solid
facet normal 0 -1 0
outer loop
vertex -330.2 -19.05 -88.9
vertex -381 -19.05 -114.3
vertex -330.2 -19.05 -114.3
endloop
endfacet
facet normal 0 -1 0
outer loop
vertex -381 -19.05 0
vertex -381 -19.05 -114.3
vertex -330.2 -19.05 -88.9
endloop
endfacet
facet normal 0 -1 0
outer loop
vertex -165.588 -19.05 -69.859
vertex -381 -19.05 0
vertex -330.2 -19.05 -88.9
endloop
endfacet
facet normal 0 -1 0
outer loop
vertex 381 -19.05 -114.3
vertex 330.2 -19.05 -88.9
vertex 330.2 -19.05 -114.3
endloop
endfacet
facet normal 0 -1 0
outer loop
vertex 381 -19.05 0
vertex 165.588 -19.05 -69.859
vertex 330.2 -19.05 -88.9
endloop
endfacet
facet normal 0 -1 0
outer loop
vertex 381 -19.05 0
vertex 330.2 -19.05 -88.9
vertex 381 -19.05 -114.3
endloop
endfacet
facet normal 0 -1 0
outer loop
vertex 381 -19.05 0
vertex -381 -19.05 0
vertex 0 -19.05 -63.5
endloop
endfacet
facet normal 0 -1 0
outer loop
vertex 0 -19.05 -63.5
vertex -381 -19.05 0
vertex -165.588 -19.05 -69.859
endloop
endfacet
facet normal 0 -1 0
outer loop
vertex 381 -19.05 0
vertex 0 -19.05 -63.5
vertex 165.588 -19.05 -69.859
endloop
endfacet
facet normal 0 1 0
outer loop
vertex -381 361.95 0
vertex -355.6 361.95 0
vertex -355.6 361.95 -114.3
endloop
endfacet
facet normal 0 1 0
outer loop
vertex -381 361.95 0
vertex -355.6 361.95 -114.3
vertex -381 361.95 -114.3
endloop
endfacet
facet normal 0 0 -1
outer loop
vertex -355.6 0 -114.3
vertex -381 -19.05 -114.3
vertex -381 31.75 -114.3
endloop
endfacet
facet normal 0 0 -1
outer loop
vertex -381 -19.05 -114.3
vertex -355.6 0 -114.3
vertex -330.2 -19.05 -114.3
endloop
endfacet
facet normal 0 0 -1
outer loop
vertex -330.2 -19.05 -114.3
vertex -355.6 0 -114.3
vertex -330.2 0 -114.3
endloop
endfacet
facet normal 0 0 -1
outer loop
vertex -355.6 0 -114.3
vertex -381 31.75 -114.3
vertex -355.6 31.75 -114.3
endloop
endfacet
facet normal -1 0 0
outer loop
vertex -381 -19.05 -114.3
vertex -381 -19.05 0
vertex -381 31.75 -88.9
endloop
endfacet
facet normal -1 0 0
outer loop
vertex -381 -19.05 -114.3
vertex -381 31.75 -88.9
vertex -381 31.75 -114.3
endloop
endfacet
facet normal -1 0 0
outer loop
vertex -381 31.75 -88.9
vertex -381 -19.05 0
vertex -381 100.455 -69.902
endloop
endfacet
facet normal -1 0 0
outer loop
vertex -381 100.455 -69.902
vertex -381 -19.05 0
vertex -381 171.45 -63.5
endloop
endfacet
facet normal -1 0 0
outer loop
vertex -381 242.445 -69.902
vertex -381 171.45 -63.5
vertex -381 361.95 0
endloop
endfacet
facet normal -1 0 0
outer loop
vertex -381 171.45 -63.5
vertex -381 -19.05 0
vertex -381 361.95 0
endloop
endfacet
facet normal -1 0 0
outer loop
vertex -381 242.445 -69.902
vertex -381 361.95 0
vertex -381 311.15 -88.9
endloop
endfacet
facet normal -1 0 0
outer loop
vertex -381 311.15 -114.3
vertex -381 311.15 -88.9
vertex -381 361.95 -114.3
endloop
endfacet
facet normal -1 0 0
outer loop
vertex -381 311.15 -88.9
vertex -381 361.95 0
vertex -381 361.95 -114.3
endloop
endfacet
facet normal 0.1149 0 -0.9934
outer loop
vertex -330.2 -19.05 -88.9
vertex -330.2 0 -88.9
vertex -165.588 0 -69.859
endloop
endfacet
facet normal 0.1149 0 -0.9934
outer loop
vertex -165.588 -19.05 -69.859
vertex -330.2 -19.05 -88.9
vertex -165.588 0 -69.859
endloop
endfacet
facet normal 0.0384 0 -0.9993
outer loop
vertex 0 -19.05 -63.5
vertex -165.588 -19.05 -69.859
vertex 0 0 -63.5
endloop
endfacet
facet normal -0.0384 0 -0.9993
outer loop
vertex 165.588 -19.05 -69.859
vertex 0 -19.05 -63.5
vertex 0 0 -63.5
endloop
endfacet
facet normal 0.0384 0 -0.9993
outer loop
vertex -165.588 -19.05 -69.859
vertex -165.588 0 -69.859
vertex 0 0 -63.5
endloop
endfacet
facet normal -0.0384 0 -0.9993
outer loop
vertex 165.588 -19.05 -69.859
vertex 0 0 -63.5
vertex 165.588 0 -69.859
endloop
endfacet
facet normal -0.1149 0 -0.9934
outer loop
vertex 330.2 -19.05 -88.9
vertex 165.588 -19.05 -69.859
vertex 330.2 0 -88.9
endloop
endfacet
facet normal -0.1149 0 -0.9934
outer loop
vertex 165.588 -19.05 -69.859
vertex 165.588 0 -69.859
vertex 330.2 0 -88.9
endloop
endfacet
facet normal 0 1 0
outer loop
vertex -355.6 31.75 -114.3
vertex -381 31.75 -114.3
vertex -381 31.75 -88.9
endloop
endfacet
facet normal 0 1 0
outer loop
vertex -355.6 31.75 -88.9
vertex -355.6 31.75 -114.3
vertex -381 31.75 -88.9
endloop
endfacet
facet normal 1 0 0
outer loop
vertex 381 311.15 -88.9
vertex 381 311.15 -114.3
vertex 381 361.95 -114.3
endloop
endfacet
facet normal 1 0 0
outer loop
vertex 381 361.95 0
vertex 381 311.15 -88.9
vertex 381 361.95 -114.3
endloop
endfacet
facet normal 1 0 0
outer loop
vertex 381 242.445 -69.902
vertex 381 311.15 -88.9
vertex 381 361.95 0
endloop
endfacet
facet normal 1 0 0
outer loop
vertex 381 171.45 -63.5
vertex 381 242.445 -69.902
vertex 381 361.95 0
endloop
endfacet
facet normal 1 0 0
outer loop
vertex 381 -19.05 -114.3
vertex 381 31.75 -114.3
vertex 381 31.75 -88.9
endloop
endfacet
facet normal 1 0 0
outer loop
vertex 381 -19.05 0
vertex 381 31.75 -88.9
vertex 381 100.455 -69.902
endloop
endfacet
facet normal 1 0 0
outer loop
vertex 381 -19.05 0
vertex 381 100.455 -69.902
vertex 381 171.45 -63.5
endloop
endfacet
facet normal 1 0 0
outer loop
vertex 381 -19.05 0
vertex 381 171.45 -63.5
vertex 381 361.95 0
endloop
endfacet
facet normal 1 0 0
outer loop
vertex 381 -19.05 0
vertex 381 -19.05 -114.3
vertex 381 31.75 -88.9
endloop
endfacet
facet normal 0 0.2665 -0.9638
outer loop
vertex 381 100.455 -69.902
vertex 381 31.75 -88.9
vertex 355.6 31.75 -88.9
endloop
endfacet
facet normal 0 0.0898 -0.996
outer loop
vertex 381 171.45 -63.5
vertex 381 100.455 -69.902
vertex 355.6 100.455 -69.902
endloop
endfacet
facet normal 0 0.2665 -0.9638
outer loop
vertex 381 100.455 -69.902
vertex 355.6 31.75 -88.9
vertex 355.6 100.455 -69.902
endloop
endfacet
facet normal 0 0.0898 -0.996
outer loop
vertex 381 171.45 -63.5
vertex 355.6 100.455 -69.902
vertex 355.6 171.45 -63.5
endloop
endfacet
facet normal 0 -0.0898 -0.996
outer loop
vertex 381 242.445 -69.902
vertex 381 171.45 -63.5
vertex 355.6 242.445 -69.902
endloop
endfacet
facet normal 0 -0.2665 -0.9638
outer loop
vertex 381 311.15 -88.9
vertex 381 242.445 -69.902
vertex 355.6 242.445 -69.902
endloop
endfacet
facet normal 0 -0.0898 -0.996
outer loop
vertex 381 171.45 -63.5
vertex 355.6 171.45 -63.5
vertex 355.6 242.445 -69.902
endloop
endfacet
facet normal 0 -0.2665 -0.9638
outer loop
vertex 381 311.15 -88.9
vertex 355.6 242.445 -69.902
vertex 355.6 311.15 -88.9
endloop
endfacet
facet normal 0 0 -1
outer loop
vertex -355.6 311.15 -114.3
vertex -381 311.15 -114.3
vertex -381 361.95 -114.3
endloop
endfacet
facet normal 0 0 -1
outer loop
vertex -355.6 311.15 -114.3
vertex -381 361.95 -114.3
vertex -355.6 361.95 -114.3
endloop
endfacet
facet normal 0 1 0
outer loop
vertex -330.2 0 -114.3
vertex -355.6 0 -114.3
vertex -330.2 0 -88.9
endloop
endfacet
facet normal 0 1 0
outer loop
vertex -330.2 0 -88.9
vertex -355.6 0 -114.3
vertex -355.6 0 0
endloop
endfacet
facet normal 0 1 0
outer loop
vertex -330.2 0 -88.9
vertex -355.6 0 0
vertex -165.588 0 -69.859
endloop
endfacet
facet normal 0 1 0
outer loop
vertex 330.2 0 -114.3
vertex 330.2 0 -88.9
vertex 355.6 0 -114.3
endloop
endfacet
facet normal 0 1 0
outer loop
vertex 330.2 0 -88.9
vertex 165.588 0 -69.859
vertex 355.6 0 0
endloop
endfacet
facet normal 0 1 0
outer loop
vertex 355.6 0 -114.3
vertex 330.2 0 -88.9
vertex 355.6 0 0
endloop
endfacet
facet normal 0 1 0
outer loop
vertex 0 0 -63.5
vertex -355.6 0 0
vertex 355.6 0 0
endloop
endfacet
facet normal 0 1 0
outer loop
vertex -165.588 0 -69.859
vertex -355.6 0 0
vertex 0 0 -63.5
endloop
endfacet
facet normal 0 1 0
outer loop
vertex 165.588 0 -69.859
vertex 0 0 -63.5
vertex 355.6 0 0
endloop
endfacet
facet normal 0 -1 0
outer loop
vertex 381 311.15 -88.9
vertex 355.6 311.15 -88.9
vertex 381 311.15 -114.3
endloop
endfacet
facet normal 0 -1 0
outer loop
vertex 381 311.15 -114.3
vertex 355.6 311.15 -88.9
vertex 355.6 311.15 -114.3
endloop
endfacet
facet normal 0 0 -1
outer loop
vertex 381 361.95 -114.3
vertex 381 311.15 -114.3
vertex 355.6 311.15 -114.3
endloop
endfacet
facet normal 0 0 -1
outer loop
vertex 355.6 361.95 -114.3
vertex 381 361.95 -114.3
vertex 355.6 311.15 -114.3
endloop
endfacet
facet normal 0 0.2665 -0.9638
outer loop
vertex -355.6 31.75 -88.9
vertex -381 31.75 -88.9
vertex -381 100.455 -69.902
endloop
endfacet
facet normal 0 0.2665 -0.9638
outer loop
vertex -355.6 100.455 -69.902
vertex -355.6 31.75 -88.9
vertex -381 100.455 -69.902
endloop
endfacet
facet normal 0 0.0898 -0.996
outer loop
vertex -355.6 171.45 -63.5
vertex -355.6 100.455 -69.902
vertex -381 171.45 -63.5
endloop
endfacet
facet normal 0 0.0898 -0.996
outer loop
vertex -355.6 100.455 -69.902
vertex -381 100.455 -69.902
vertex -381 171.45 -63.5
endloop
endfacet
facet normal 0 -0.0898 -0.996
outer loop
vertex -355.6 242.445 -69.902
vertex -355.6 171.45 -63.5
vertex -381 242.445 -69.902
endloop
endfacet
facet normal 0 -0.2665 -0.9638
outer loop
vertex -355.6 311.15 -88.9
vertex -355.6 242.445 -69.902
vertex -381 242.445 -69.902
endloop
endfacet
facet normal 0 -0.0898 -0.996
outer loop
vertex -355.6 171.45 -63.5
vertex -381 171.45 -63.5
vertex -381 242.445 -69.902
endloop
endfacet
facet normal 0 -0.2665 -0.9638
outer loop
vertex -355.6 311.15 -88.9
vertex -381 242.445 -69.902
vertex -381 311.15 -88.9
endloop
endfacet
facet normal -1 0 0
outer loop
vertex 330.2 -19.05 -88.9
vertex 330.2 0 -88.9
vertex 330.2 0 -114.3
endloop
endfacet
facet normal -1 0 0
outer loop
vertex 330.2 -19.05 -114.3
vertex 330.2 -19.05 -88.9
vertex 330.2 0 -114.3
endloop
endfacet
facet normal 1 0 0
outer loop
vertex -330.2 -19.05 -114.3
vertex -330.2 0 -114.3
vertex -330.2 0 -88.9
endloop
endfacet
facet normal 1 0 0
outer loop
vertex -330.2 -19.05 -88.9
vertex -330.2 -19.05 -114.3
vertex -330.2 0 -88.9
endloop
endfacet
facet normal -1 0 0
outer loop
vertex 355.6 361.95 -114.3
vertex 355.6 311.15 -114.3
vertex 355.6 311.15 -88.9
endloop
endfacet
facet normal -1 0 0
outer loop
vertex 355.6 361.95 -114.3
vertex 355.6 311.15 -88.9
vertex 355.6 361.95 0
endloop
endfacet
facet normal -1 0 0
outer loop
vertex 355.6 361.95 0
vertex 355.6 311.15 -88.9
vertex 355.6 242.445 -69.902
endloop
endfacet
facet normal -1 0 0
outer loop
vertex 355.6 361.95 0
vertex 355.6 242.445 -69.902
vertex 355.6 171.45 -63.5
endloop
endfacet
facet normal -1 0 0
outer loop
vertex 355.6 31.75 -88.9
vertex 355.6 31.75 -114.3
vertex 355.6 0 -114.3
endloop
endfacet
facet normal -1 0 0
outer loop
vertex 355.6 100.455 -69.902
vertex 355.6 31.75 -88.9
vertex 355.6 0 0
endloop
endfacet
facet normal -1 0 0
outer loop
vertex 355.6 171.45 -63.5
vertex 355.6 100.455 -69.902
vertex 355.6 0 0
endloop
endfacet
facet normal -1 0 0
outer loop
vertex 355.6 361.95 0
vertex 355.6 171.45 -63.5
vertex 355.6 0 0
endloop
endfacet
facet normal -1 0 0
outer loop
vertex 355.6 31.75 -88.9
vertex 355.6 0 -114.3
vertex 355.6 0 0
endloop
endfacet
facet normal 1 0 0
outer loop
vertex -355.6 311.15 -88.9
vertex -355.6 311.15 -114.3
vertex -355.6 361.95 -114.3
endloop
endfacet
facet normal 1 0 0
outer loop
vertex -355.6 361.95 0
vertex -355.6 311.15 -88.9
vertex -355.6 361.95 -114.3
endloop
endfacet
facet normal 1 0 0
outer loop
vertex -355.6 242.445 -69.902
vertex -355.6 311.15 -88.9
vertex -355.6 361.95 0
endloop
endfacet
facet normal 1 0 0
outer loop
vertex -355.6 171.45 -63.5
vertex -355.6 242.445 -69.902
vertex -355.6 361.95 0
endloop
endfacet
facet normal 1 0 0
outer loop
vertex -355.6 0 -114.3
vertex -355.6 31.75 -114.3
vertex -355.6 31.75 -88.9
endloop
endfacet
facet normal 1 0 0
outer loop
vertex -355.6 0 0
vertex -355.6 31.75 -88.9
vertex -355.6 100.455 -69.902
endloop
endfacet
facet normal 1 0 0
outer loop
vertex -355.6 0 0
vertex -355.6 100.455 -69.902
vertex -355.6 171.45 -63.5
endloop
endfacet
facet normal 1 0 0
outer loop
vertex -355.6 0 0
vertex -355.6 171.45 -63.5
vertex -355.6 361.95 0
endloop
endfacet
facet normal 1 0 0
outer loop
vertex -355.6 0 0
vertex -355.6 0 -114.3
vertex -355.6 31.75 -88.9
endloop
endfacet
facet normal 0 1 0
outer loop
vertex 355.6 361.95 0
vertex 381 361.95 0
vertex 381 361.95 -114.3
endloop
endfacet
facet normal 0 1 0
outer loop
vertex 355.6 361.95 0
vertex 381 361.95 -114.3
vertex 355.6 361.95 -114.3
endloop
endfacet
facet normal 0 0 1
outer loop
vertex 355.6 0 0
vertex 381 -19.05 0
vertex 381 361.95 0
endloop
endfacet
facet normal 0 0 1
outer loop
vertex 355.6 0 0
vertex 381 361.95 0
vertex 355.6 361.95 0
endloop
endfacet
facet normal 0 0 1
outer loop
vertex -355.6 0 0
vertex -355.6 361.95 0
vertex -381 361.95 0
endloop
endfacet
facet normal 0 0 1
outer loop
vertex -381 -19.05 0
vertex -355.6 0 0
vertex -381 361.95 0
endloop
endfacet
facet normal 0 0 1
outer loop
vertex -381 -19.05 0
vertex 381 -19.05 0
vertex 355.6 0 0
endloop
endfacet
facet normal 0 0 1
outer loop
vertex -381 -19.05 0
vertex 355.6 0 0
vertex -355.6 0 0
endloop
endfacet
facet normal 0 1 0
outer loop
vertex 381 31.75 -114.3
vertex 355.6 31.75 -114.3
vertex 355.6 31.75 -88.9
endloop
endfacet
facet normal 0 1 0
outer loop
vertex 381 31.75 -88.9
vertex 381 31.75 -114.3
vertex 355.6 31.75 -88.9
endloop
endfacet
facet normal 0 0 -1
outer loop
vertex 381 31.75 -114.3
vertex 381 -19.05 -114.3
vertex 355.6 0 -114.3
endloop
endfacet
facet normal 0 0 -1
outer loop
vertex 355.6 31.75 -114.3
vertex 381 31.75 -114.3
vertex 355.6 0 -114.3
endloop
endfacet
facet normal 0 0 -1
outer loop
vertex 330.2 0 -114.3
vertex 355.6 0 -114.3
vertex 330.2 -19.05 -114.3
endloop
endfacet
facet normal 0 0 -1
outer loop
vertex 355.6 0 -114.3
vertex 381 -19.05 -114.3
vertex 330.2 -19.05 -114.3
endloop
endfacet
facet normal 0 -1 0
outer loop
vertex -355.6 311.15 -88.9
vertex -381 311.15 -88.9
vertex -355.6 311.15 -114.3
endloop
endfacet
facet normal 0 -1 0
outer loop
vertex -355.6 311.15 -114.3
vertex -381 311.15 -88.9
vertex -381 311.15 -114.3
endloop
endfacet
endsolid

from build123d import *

# Parameters (mm, degrees)
F1_DEPTH = 19.05
F2_W     = 25.4
F2_H     = 114.3
F3_DEPTH = 361.95
F5_DEPTH = 762


with BuildPart() as f1:
    # F0 (on Front) → F1 (new body)
    with BuildSketch(Plane.XZ):
        with BuildLine():
            Line((381, 0), (-381, 0))
            Line((-381, 0), (-381, -114.3))
            Line((-381, -114.3), (-330.2, -114.3))
            Line((-330.2, -114.3), (-330.2, -88.9))
            ThreePointArc((-330.2, -88.9), (0, -63.5), (330.2, -88.9))
            Line((330.2, -88.9), (330.2, -114.3))
            Line((330.2, -114.3), (381, -114.3))
            Line((381, -114.3), (381, 0))
        make_face()
    extrude(amount=F1_DEPTH)

    # F2 (on face) → F3 (join)
    with BuildSketch(Plane(origin=(0, 0, 0), x_dir=(-1, 0, 0), z_dir=(0, 1, 0))):
        with Locations((-368.3, -57.15)):
            Rectangle(F2_W, F2_H)
        with Locations((368.3, -57.15)):
            Rectangle(F2_W, F2_H)
    extrude(amount=F3_DEPTH)

    # F4 (on face) → F5 (cut)
    with BuildSketch(Plane(origin=(-381, 0, 0), x_dir=(0, -1, 0), z_dir=(-1, 0, 0))):
        with BuildLine():
            Line((-311.15, -88.9), (-311.15, -114.3))
            Line((-311.15, -114.3), (-31.75, -114.3))
            Line((-31.75, -114.3), (-31.75, -88.9))
            ThreePointArc((-31.75, -88.9), (-171.45, -63.5), (-311.15, -88.9))
        make_face()
    extrude(amount=-F5_DEPTH, mode=Mode.SUBTRACT)


solid = f1.part
